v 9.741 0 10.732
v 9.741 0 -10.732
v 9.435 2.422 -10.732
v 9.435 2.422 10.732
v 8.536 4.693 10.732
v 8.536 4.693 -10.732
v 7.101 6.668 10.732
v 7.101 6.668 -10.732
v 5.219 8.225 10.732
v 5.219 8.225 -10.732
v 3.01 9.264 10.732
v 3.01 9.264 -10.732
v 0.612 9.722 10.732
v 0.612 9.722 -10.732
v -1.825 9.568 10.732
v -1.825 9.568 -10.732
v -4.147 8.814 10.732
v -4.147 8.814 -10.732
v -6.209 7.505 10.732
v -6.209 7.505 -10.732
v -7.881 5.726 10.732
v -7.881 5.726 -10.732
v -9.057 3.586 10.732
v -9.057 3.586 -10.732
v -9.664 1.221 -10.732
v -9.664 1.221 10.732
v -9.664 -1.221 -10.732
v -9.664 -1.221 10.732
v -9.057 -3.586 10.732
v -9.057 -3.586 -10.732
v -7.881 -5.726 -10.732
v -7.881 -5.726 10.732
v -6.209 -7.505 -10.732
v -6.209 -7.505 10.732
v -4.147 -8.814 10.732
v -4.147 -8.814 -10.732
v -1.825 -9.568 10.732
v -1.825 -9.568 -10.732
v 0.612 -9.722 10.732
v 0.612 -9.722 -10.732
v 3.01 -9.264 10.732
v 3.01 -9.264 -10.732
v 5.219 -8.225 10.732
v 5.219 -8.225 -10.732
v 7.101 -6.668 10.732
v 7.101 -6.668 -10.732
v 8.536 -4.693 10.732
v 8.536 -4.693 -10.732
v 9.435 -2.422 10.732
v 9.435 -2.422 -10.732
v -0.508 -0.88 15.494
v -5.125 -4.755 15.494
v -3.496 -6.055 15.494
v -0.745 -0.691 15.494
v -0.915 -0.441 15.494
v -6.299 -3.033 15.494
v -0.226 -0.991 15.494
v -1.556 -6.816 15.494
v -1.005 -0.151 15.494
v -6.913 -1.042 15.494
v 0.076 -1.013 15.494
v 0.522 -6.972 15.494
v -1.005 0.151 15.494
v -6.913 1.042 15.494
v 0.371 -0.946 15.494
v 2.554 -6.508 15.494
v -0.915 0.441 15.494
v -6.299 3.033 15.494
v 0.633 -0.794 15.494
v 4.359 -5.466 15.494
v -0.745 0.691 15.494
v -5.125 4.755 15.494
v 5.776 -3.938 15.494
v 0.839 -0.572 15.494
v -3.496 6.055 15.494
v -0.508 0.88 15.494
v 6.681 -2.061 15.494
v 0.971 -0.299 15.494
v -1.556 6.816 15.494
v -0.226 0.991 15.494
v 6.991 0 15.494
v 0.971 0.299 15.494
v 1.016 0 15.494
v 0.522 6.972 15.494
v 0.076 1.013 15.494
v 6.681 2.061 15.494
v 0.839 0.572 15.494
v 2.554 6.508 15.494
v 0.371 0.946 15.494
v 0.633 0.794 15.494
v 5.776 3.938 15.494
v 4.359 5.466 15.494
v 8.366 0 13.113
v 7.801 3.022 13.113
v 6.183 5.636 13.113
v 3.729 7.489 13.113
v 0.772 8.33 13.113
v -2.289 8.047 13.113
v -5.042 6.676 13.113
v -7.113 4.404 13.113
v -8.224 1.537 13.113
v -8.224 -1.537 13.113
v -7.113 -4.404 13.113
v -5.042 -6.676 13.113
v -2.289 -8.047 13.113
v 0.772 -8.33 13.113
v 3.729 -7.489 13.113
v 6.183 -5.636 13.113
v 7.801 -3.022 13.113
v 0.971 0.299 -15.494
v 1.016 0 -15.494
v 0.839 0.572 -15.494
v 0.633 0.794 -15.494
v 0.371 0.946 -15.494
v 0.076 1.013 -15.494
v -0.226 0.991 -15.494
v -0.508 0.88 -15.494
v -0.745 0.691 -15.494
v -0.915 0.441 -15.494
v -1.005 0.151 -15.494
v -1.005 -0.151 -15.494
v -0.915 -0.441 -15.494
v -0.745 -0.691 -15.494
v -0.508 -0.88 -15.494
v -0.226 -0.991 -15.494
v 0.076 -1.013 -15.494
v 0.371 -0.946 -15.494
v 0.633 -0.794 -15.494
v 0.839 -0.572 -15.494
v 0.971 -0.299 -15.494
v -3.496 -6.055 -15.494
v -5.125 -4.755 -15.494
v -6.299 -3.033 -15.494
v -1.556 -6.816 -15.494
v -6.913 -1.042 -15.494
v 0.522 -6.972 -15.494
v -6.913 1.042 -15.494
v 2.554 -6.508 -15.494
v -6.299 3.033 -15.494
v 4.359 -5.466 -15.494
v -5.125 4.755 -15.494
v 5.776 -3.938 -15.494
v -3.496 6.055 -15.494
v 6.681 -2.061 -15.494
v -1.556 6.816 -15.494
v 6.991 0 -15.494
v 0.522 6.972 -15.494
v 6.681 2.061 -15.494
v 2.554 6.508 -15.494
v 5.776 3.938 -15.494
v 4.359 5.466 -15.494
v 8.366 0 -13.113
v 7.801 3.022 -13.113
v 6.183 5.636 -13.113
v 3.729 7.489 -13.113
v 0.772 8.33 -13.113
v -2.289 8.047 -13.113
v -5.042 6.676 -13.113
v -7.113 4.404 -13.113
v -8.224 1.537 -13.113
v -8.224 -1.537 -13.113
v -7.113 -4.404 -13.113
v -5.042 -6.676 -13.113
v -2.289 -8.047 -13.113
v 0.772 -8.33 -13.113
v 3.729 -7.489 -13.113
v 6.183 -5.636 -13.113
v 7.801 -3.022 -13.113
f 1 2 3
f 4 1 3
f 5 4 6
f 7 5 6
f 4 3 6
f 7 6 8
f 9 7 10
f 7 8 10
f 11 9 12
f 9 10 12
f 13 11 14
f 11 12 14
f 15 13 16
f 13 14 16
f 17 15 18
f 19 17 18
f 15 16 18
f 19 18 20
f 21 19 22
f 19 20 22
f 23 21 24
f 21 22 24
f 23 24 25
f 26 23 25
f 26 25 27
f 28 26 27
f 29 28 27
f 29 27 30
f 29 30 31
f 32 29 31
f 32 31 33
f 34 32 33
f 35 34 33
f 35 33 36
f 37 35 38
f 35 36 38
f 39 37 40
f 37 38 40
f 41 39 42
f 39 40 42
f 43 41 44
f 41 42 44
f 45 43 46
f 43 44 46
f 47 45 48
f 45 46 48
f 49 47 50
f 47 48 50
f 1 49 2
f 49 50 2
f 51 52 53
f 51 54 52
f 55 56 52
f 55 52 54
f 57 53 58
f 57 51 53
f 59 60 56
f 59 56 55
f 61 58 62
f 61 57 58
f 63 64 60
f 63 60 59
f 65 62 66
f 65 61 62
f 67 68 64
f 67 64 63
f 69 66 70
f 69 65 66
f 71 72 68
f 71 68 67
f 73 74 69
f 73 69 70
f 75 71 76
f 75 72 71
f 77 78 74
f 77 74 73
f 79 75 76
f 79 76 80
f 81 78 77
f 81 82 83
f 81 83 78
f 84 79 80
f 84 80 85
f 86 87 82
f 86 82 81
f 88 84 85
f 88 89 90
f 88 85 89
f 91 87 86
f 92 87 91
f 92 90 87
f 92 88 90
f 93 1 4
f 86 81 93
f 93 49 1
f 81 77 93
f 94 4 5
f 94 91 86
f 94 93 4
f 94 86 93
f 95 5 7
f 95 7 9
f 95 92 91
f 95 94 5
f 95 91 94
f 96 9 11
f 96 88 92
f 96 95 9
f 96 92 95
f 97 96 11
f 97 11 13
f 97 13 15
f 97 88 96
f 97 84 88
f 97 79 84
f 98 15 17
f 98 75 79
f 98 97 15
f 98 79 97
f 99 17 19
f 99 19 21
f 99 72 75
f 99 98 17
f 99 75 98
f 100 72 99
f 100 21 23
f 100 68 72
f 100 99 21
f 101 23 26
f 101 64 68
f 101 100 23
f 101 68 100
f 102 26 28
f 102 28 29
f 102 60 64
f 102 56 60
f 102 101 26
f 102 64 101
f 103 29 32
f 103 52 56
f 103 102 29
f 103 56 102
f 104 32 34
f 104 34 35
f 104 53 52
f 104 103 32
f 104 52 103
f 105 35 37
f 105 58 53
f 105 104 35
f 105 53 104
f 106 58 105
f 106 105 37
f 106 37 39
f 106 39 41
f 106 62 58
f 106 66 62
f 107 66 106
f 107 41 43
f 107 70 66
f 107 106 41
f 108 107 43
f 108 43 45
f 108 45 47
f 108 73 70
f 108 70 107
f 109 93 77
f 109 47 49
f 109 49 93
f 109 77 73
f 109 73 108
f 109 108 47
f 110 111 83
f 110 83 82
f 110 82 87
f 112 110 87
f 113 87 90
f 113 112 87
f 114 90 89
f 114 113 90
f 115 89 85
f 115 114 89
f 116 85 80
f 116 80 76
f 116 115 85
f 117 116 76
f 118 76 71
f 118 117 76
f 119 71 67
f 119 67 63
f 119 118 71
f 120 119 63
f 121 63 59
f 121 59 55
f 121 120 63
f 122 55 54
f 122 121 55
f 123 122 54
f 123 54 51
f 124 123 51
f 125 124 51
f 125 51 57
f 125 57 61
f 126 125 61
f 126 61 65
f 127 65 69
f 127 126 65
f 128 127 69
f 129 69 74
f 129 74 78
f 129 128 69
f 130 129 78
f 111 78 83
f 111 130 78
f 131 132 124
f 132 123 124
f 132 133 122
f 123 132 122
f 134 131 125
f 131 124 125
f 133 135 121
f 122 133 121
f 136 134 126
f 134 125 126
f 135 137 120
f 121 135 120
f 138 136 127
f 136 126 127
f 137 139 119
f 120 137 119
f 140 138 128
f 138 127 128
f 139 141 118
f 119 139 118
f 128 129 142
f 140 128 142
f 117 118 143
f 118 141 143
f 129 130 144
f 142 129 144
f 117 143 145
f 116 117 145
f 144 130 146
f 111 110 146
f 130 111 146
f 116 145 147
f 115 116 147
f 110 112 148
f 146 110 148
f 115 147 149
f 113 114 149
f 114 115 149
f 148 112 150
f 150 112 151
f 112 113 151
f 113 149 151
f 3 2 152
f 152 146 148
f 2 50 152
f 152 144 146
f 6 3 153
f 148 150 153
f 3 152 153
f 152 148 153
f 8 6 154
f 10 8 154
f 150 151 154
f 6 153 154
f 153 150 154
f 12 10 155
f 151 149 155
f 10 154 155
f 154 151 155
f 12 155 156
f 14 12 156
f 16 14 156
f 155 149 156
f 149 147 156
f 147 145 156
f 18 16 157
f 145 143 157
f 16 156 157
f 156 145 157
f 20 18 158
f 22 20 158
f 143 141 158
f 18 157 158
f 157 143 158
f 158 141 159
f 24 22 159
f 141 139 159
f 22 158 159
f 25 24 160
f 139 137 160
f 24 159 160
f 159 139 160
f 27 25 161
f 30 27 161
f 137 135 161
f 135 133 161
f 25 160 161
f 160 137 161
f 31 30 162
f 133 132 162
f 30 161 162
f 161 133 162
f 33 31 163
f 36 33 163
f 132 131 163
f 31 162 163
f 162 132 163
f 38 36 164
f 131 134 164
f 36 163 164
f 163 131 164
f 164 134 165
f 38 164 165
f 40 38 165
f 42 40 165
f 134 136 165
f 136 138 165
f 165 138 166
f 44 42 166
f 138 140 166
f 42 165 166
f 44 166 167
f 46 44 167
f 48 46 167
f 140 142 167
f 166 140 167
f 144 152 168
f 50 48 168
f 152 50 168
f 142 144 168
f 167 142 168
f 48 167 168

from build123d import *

# Parameters (mm, degrees)
BOSS_EXTRUDE1_DEPTH      = 15.494
BOSS_EXTRUDE1_DEPTH_BACK = 15.494
SKETCH1_R                = 9.7409
SKETCH1_R_2              = 1.016
CHAMFER2_SIZE            = 4.7625
CHAMFER2_SIZE2           = 2.749630657
CHAMFER3_SIZE            = 4.7625
CHAMFER3_SIZE2           = 2.749630657


with BuildPart() as part:
    # Sketch1 → Boss-Extrude1 (new, two sides: drawn at the far end of the back side and taken through both)
    with BuildSketch(Plane.XY.offset(-BOSS_EXTRUDE1_DEPTH_BACK)):
        Circle(SKETCH1_R)
        Circle(SKETCH1_R_2, mode=Mode.SUBTRACT)
    extrude(amount=BOSS_EXTRUDE1_DEPTH + BOSS_EXTRUDE1_DEPTH_BACK)

    # Chamfer2
    chamfer2_edges = [part.edges().sort_by_distance(p)[0] for p in [
        (-9.7409, 0, -15.494),
    ]]
    chamfer2_side = [part.faces().sort_by_distance(p)[0] for p in [
        (-9.7409, 0, -7.747),
    ]]
    chamfer(chamfer2_edges, length=CHAMFER2_SIZE, length2=CHAMFER2_SIZE2, reference=chamfer2_side[0])

    # Chamfer3
    chamfer3_edges = [part.edges().sort_by_distance(p)[0] for p in [
        (-9.7409, 0, 15.494),
    ]]
    chamfer3_side = [part.faces().sort_by_distance(p)[0] for p in [
        (-9.7409, 0, 2.38125),
    ]]
    chamfer(chamfer3_edges, length=CHAMFER3_SIZE, length2=CHAMFER3_SIZE2, reference=chamfer3_side[0])


solid = part.part
